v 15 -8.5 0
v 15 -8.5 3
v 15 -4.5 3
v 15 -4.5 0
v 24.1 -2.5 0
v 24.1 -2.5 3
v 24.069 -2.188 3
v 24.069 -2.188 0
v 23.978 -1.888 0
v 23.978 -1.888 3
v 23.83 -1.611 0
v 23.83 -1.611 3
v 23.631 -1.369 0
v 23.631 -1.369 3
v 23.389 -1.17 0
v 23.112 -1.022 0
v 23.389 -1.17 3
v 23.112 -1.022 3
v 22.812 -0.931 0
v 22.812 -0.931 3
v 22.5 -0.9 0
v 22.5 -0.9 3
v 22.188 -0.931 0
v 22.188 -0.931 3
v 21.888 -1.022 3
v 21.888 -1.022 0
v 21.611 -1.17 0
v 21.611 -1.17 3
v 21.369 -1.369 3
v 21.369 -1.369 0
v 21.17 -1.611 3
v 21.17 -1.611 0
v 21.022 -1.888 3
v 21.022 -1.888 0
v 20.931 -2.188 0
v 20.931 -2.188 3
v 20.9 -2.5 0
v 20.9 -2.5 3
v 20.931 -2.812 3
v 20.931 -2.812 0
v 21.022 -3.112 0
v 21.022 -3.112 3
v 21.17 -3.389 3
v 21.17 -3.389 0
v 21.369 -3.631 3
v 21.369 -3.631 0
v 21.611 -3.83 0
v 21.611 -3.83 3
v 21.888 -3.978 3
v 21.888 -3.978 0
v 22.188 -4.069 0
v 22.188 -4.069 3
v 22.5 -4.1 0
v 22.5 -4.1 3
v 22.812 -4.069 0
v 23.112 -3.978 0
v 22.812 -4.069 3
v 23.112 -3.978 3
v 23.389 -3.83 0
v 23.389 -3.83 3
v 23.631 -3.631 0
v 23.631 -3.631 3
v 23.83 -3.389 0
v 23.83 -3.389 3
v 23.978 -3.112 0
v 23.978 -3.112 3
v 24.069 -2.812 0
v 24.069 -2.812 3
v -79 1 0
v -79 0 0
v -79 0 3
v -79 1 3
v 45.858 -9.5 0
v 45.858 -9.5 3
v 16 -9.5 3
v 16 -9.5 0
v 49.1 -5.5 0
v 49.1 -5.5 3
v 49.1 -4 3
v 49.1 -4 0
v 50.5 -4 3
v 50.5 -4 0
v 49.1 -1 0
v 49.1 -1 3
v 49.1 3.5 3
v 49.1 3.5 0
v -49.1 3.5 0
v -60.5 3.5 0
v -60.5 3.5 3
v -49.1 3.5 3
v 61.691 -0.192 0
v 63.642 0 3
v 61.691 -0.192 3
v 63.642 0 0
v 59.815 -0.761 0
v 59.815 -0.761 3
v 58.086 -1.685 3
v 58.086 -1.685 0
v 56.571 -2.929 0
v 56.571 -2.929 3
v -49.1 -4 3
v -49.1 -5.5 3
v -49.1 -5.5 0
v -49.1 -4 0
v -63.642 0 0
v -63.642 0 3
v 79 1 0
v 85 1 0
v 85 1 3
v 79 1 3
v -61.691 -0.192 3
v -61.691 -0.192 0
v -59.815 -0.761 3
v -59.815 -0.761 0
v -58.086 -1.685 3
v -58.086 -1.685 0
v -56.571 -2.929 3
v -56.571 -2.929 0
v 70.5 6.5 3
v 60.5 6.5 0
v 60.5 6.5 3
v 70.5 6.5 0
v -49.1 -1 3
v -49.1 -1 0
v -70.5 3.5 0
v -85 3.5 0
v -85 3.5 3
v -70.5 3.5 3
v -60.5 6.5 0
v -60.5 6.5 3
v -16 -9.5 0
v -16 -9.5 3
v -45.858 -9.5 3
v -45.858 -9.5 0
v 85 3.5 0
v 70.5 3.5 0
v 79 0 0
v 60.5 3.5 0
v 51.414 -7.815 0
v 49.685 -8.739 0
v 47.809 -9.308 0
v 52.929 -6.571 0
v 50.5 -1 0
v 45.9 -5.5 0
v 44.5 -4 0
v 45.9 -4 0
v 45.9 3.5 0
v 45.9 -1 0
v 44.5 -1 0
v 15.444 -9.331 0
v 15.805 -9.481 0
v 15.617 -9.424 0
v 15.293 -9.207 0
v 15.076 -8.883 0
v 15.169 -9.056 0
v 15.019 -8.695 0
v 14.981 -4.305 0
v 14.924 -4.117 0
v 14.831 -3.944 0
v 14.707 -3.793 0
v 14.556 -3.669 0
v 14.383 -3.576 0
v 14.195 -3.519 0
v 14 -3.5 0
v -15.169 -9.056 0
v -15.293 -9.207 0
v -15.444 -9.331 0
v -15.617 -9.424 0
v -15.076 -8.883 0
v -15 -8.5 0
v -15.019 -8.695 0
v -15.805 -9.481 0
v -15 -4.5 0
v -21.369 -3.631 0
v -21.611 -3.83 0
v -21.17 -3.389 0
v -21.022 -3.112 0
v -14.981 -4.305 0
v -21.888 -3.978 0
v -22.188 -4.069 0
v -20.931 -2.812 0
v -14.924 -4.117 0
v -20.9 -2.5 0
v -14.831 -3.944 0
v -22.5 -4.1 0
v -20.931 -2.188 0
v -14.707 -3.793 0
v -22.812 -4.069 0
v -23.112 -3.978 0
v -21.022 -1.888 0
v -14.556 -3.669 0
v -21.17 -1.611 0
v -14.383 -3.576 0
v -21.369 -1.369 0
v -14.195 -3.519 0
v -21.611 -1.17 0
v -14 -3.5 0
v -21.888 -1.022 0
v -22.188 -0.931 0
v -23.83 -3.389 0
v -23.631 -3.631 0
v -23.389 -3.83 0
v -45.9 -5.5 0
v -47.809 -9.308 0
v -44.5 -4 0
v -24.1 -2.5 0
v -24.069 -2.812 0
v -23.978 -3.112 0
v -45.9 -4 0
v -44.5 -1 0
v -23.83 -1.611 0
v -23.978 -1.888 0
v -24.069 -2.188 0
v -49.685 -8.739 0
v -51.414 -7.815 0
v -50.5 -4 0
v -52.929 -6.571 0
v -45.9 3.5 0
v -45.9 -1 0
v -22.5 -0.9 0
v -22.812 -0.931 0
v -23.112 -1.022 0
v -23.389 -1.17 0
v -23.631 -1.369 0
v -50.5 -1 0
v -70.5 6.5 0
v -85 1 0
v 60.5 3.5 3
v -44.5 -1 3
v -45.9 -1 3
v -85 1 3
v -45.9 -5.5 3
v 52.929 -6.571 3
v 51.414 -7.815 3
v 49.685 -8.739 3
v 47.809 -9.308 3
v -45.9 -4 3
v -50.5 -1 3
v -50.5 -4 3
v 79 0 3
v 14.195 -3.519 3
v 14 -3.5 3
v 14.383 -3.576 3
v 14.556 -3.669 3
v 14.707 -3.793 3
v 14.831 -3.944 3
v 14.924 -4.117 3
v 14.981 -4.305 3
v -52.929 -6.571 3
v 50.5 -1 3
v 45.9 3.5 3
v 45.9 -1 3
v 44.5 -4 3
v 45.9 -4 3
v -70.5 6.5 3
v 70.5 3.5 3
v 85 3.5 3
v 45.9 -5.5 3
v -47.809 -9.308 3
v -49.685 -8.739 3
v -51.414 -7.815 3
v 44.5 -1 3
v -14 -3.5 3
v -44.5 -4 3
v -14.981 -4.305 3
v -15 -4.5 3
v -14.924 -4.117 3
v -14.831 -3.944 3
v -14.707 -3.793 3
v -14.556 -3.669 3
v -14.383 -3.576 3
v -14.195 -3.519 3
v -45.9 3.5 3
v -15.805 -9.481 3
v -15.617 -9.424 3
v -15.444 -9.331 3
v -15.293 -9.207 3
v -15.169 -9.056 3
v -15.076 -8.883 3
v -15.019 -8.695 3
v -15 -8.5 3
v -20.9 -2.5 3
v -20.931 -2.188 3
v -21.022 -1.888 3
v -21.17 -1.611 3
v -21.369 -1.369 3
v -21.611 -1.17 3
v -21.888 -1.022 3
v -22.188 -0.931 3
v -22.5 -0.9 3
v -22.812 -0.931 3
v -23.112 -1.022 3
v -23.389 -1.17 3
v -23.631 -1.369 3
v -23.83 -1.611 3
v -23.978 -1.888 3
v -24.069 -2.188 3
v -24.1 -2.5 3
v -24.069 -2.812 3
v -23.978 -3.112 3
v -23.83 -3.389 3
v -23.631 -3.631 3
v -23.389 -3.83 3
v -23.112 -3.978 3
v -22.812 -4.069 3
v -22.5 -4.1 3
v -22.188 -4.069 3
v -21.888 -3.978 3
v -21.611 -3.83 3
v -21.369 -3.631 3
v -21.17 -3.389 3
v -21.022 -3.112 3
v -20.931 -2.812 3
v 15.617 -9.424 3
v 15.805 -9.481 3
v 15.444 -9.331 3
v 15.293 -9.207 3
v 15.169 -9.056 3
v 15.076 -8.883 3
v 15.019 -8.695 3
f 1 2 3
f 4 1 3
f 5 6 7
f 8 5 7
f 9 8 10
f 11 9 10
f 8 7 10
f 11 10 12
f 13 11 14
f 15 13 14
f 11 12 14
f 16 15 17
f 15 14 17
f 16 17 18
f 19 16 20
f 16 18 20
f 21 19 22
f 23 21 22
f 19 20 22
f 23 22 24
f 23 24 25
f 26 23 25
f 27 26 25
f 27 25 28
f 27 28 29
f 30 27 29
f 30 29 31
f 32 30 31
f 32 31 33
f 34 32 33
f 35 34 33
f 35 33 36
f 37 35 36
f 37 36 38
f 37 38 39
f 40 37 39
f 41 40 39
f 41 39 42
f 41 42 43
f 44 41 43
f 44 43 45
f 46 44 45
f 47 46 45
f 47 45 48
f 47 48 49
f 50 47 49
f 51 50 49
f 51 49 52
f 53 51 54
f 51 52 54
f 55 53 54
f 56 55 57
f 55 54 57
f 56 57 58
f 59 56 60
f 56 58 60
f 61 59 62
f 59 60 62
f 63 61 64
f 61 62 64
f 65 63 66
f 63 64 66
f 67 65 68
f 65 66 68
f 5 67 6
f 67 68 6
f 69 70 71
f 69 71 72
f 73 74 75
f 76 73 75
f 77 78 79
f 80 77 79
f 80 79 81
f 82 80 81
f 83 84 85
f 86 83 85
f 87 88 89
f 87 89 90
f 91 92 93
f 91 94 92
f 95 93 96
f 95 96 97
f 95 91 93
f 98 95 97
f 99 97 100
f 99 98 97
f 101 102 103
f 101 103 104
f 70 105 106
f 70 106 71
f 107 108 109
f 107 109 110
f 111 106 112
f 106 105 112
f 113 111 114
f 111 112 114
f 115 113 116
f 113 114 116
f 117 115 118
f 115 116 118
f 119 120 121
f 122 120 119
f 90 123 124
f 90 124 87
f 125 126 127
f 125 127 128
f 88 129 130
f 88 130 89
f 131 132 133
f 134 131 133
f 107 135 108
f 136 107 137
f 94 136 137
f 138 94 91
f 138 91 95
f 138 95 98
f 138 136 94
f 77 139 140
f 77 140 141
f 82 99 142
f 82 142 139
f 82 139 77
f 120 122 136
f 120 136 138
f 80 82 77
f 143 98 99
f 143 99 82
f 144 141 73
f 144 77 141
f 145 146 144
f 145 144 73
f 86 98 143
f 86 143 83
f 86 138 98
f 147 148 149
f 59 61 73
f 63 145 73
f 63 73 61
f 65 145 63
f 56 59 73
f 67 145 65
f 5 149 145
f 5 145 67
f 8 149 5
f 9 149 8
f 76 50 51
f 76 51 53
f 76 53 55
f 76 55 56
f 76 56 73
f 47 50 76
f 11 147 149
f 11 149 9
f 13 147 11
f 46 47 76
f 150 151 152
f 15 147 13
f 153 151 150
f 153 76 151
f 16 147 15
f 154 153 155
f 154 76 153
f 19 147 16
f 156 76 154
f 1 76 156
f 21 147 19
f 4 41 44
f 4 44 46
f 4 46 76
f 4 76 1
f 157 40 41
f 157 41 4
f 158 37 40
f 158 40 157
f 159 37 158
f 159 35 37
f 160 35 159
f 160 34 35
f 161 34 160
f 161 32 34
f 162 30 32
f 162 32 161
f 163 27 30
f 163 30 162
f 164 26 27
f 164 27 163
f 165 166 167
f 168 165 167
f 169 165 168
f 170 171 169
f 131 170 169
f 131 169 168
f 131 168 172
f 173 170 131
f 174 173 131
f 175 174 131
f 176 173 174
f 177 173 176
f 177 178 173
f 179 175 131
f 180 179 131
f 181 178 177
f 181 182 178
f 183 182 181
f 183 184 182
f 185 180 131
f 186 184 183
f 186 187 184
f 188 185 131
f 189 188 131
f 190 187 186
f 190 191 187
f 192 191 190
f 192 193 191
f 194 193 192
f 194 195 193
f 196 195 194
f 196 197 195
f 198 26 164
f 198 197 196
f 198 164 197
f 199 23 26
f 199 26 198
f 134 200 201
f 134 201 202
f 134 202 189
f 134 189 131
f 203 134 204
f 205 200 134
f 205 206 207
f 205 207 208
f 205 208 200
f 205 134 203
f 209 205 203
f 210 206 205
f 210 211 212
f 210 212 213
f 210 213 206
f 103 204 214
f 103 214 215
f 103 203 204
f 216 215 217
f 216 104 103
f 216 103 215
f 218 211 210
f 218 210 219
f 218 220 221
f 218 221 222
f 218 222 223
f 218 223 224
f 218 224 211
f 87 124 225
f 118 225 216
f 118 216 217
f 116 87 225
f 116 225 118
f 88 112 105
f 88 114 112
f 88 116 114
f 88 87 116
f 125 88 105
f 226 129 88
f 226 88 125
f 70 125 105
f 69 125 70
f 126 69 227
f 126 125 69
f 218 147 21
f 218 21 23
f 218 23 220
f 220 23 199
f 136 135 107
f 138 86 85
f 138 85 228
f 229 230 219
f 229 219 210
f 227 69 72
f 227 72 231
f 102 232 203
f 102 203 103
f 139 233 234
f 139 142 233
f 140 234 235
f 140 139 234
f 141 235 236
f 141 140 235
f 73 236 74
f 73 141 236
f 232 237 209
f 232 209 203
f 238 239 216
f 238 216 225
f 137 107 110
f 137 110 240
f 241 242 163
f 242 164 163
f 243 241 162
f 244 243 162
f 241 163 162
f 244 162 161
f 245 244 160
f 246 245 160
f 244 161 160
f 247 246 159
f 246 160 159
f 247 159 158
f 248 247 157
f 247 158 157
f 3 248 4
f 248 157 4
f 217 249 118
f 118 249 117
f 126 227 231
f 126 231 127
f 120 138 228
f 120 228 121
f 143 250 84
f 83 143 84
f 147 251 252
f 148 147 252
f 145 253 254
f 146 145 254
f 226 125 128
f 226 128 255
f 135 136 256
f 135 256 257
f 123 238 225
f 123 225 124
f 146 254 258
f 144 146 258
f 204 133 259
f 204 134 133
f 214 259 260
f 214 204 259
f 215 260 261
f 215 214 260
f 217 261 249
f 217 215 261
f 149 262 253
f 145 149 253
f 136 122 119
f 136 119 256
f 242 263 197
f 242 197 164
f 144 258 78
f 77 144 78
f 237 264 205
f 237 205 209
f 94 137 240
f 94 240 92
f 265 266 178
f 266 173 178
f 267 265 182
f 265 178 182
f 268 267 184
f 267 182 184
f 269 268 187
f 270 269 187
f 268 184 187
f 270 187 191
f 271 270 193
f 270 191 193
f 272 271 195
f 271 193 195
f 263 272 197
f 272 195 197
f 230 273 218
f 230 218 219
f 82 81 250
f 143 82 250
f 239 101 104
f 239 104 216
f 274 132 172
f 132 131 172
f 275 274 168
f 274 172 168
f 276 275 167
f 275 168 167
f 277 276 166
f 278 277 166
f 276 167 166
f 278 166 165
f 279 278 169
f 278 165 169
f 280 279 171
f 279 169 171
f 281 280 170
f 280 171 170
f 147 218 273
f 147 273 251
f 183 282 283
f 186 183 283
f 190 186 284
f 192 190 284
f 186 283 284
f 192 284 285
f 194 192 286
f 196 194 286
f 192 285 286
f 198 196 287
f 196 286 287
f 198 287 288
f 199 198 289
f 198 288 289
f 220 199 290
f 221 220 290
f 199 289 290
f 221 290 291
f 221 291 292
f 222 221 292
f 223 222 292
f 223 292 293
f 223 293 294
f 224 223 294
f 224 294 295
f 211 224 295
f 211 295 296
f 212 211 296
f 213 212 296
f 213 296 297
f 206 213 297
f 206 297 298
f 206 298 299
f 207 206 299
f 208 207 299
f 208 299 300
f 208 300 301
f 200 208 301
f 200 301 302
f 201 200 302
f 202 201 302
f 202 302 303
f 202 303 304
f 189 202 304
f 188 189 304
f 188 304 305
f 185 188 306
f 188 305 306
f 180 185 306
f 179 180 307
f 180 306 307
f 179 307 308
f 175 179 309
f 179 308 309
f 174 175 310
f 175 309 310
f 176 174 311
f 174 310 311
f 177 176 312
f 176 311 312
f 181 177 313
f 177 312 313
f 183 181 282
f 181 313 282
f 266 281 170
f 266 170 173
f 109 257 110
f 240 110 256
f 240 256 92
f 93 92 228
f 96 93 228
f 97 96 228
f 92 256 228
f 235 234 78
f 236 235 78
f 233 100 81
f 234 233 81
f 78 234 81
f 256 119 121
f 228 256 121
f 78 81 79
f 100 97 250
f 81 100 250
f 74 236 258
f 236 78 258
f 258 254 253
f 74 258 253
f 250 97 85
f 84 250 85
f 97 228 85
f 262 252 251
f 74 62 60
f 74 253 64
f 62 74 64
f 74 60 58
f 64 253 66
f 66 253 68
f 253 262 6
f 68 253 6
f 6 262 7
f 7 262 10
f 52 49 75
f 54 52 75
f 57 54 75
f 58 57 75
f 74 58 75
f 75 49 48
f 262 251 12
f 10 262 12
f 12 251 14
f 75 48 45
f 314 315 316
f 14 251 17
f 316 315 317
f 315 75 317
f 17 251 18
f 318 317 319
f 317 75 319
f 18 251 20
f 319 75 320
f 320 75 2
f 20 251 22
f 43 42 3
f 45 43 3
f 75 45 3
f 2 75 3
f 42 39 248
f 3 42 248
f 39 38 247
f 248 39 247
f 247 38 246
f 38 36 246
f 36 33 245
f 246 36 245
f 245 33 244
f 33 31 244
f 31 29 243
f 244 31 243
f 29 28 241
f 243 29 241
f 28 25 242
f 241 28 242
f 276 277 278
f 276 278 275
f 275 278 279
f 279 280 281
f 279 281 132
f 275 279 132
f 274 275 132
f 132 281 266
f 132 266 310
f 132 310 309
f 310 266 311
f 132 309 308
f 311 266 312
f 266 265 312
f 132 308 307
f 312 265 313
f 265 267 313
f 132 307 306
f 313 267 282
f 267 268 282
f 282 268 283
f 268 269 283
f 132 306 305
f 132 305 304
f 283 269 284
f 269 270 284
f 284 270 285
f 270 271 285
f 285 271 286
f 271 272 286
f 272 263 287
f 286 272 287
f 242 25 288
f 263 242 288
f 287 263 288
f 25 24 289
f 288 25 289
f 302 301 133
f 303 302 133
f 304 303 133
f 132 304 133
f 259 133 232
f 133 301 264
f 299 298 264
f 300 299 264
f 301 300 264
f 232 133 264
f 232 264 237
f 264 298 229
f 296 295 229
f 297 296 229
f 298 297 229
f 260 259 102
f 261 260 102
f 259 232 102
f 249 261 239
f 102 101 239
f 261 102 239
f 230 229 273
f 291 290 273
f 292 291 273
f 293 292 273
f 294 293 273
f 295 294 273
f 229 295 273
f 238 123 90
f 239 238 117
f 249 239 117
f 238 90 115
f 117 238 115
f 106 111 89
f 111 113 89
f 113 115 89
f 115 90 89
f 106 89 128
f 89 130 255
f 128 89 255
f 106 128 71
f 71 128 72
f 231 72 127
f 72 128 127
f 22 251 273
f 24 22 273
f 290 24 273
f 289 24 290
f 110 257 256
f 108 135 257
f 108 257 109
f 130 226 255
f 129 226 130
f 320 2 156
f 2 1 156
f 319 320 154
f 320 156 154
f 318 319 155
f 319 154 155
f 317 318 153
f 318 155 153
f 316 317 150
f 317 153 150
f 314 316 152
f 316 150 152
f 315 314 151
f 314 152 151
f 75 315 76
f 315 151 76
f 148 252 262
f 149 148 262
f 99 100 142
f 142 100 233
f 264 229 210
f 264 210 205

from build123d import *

# Parameters (mm, degrees)
EXTRUDE_1_DEPTH     = 3
SKETCH_2_W          = 55
SKETCH_2_H          = 3
CUT_EXTRUDE_1_DEPTH = 86.300937861
EXTRUDE_2_DEPTH     = 3
FILLET_1_R          = 10
SKETCH_4_R          = 1.6
SKETCH_4_W          = 30
SKETCH_4_H          = 6
CUT_EXTRUDE_2_DEPTH = 86.581832184
FILLET_2_R          = 1


with BuildPart() as part:
    # 草图1 → 凸台-拉伸1 (new body)
    with BuildSketch(Plane.XY):
        Polygon((-85, 1), (-85, 3.5), (-70.5, 3.5), (-70.5, 6.5), (-60.5, 6.5), (-60.5, 3.5), (-27.5, 3.5), (-27.5, 6.5), (-17.5, 6.5), (-17.5, 3.5), (17.5, 3.5), (17.5, 6.5), (27.5, 6.5), (27.5, 3.5), (60.5, 3.5), (60.5, 6.5), (70.5, 6.5), (70.5, 3.5), (85, 3.5), (85, 1), (79, 1), (79, 0), (-79, 0), (-79, 1), align=None)
    extrude(amount=EXTRUDE_1_DEPTH)

    # 草图2 → 切除-拉伸1 (cut, through all)
    with BuildSketch(Plane.XY.offset(3)):
        with Locations((0, 5)):
            Rectangle(SKETCH_2_W, SKETCH_2_H)
    extrude(amount=-CUT_EXTRUDE_1_DEPTH, mode=Mode.SUBTRACT)

    # 草图3 → 凸台-拉伸2 (add)
    with BuildSketch(Plane.XY.offset(3)):
        Polygon((-50, 0), (50, 0), (59.5, 0), (50, -9.5), (-50, -9.5), (-59.5, 0), align=None)
    extrude(amount=-EXTRUDE_2_DEPTH)

    # 圆角1
    fillet_1_edges = [part.edges().sort_by_distance(p)[0] for p in [
        (-59.5, 0, 1.5),
        (59.5, 0, 1.5),
        (50, -9.5, 1.5),
        (-50, -9.5, 1.5),
    ]]
    fillet(fillet_1_edges, radius=FILLET_1_R)

    # 草图4 → 切除-拉伸2 (cut, through all)
    with BuildSketch(Plane.XY.offset(3)):
        with Locations((-22.5, -2.5)):
            Circle(SKETCH_4_R)
        with Locations((22.5, -2.5)):
            Circle(SKETCH_4_R)
        Polygon((-49.1, 3.5), (-45.9, 3.5), (-45.9, -1), (-44.5, -1), (-44.5, -4), (-45.9, -4), (-45.9, -5.5), (-49.1, -5.5), (-49.1, -4), (-50.5, -4), (-50.5, -1), (-49.1, -1), align=None)
        Polygon((50.5, -1), (49.1, -1), (49.1, 3.5), (45.9, 3.5), (45.9, -1), (44.5, -1), (44.5, -4), (45.9, -4), (45.9, -5.5), (49.1, -5.5), (49.1, -4), (50.5, -4), align=None)
        with Locations((0, -6.5)):
            Rectangle(SKETCH_4_W, SKETCH_4_H)
    extrude(amount=-CUT_EXTRUDE_2_DEPTH, mode=Mode.SUBTRACT)

    # 圆角2
    fillet_2_edges = [part.edges().sort_by_distance(p)[0] for p in [
        (-15, -9.5, 1.5),
        (-15, -3.5, 1.5),
        (15, -3.5, 1.5),
        (15, -9.5, 1.5),
    ]]
    fillet(fillet_2_edges, radius=FILLET_2_R)


solid = part.part
